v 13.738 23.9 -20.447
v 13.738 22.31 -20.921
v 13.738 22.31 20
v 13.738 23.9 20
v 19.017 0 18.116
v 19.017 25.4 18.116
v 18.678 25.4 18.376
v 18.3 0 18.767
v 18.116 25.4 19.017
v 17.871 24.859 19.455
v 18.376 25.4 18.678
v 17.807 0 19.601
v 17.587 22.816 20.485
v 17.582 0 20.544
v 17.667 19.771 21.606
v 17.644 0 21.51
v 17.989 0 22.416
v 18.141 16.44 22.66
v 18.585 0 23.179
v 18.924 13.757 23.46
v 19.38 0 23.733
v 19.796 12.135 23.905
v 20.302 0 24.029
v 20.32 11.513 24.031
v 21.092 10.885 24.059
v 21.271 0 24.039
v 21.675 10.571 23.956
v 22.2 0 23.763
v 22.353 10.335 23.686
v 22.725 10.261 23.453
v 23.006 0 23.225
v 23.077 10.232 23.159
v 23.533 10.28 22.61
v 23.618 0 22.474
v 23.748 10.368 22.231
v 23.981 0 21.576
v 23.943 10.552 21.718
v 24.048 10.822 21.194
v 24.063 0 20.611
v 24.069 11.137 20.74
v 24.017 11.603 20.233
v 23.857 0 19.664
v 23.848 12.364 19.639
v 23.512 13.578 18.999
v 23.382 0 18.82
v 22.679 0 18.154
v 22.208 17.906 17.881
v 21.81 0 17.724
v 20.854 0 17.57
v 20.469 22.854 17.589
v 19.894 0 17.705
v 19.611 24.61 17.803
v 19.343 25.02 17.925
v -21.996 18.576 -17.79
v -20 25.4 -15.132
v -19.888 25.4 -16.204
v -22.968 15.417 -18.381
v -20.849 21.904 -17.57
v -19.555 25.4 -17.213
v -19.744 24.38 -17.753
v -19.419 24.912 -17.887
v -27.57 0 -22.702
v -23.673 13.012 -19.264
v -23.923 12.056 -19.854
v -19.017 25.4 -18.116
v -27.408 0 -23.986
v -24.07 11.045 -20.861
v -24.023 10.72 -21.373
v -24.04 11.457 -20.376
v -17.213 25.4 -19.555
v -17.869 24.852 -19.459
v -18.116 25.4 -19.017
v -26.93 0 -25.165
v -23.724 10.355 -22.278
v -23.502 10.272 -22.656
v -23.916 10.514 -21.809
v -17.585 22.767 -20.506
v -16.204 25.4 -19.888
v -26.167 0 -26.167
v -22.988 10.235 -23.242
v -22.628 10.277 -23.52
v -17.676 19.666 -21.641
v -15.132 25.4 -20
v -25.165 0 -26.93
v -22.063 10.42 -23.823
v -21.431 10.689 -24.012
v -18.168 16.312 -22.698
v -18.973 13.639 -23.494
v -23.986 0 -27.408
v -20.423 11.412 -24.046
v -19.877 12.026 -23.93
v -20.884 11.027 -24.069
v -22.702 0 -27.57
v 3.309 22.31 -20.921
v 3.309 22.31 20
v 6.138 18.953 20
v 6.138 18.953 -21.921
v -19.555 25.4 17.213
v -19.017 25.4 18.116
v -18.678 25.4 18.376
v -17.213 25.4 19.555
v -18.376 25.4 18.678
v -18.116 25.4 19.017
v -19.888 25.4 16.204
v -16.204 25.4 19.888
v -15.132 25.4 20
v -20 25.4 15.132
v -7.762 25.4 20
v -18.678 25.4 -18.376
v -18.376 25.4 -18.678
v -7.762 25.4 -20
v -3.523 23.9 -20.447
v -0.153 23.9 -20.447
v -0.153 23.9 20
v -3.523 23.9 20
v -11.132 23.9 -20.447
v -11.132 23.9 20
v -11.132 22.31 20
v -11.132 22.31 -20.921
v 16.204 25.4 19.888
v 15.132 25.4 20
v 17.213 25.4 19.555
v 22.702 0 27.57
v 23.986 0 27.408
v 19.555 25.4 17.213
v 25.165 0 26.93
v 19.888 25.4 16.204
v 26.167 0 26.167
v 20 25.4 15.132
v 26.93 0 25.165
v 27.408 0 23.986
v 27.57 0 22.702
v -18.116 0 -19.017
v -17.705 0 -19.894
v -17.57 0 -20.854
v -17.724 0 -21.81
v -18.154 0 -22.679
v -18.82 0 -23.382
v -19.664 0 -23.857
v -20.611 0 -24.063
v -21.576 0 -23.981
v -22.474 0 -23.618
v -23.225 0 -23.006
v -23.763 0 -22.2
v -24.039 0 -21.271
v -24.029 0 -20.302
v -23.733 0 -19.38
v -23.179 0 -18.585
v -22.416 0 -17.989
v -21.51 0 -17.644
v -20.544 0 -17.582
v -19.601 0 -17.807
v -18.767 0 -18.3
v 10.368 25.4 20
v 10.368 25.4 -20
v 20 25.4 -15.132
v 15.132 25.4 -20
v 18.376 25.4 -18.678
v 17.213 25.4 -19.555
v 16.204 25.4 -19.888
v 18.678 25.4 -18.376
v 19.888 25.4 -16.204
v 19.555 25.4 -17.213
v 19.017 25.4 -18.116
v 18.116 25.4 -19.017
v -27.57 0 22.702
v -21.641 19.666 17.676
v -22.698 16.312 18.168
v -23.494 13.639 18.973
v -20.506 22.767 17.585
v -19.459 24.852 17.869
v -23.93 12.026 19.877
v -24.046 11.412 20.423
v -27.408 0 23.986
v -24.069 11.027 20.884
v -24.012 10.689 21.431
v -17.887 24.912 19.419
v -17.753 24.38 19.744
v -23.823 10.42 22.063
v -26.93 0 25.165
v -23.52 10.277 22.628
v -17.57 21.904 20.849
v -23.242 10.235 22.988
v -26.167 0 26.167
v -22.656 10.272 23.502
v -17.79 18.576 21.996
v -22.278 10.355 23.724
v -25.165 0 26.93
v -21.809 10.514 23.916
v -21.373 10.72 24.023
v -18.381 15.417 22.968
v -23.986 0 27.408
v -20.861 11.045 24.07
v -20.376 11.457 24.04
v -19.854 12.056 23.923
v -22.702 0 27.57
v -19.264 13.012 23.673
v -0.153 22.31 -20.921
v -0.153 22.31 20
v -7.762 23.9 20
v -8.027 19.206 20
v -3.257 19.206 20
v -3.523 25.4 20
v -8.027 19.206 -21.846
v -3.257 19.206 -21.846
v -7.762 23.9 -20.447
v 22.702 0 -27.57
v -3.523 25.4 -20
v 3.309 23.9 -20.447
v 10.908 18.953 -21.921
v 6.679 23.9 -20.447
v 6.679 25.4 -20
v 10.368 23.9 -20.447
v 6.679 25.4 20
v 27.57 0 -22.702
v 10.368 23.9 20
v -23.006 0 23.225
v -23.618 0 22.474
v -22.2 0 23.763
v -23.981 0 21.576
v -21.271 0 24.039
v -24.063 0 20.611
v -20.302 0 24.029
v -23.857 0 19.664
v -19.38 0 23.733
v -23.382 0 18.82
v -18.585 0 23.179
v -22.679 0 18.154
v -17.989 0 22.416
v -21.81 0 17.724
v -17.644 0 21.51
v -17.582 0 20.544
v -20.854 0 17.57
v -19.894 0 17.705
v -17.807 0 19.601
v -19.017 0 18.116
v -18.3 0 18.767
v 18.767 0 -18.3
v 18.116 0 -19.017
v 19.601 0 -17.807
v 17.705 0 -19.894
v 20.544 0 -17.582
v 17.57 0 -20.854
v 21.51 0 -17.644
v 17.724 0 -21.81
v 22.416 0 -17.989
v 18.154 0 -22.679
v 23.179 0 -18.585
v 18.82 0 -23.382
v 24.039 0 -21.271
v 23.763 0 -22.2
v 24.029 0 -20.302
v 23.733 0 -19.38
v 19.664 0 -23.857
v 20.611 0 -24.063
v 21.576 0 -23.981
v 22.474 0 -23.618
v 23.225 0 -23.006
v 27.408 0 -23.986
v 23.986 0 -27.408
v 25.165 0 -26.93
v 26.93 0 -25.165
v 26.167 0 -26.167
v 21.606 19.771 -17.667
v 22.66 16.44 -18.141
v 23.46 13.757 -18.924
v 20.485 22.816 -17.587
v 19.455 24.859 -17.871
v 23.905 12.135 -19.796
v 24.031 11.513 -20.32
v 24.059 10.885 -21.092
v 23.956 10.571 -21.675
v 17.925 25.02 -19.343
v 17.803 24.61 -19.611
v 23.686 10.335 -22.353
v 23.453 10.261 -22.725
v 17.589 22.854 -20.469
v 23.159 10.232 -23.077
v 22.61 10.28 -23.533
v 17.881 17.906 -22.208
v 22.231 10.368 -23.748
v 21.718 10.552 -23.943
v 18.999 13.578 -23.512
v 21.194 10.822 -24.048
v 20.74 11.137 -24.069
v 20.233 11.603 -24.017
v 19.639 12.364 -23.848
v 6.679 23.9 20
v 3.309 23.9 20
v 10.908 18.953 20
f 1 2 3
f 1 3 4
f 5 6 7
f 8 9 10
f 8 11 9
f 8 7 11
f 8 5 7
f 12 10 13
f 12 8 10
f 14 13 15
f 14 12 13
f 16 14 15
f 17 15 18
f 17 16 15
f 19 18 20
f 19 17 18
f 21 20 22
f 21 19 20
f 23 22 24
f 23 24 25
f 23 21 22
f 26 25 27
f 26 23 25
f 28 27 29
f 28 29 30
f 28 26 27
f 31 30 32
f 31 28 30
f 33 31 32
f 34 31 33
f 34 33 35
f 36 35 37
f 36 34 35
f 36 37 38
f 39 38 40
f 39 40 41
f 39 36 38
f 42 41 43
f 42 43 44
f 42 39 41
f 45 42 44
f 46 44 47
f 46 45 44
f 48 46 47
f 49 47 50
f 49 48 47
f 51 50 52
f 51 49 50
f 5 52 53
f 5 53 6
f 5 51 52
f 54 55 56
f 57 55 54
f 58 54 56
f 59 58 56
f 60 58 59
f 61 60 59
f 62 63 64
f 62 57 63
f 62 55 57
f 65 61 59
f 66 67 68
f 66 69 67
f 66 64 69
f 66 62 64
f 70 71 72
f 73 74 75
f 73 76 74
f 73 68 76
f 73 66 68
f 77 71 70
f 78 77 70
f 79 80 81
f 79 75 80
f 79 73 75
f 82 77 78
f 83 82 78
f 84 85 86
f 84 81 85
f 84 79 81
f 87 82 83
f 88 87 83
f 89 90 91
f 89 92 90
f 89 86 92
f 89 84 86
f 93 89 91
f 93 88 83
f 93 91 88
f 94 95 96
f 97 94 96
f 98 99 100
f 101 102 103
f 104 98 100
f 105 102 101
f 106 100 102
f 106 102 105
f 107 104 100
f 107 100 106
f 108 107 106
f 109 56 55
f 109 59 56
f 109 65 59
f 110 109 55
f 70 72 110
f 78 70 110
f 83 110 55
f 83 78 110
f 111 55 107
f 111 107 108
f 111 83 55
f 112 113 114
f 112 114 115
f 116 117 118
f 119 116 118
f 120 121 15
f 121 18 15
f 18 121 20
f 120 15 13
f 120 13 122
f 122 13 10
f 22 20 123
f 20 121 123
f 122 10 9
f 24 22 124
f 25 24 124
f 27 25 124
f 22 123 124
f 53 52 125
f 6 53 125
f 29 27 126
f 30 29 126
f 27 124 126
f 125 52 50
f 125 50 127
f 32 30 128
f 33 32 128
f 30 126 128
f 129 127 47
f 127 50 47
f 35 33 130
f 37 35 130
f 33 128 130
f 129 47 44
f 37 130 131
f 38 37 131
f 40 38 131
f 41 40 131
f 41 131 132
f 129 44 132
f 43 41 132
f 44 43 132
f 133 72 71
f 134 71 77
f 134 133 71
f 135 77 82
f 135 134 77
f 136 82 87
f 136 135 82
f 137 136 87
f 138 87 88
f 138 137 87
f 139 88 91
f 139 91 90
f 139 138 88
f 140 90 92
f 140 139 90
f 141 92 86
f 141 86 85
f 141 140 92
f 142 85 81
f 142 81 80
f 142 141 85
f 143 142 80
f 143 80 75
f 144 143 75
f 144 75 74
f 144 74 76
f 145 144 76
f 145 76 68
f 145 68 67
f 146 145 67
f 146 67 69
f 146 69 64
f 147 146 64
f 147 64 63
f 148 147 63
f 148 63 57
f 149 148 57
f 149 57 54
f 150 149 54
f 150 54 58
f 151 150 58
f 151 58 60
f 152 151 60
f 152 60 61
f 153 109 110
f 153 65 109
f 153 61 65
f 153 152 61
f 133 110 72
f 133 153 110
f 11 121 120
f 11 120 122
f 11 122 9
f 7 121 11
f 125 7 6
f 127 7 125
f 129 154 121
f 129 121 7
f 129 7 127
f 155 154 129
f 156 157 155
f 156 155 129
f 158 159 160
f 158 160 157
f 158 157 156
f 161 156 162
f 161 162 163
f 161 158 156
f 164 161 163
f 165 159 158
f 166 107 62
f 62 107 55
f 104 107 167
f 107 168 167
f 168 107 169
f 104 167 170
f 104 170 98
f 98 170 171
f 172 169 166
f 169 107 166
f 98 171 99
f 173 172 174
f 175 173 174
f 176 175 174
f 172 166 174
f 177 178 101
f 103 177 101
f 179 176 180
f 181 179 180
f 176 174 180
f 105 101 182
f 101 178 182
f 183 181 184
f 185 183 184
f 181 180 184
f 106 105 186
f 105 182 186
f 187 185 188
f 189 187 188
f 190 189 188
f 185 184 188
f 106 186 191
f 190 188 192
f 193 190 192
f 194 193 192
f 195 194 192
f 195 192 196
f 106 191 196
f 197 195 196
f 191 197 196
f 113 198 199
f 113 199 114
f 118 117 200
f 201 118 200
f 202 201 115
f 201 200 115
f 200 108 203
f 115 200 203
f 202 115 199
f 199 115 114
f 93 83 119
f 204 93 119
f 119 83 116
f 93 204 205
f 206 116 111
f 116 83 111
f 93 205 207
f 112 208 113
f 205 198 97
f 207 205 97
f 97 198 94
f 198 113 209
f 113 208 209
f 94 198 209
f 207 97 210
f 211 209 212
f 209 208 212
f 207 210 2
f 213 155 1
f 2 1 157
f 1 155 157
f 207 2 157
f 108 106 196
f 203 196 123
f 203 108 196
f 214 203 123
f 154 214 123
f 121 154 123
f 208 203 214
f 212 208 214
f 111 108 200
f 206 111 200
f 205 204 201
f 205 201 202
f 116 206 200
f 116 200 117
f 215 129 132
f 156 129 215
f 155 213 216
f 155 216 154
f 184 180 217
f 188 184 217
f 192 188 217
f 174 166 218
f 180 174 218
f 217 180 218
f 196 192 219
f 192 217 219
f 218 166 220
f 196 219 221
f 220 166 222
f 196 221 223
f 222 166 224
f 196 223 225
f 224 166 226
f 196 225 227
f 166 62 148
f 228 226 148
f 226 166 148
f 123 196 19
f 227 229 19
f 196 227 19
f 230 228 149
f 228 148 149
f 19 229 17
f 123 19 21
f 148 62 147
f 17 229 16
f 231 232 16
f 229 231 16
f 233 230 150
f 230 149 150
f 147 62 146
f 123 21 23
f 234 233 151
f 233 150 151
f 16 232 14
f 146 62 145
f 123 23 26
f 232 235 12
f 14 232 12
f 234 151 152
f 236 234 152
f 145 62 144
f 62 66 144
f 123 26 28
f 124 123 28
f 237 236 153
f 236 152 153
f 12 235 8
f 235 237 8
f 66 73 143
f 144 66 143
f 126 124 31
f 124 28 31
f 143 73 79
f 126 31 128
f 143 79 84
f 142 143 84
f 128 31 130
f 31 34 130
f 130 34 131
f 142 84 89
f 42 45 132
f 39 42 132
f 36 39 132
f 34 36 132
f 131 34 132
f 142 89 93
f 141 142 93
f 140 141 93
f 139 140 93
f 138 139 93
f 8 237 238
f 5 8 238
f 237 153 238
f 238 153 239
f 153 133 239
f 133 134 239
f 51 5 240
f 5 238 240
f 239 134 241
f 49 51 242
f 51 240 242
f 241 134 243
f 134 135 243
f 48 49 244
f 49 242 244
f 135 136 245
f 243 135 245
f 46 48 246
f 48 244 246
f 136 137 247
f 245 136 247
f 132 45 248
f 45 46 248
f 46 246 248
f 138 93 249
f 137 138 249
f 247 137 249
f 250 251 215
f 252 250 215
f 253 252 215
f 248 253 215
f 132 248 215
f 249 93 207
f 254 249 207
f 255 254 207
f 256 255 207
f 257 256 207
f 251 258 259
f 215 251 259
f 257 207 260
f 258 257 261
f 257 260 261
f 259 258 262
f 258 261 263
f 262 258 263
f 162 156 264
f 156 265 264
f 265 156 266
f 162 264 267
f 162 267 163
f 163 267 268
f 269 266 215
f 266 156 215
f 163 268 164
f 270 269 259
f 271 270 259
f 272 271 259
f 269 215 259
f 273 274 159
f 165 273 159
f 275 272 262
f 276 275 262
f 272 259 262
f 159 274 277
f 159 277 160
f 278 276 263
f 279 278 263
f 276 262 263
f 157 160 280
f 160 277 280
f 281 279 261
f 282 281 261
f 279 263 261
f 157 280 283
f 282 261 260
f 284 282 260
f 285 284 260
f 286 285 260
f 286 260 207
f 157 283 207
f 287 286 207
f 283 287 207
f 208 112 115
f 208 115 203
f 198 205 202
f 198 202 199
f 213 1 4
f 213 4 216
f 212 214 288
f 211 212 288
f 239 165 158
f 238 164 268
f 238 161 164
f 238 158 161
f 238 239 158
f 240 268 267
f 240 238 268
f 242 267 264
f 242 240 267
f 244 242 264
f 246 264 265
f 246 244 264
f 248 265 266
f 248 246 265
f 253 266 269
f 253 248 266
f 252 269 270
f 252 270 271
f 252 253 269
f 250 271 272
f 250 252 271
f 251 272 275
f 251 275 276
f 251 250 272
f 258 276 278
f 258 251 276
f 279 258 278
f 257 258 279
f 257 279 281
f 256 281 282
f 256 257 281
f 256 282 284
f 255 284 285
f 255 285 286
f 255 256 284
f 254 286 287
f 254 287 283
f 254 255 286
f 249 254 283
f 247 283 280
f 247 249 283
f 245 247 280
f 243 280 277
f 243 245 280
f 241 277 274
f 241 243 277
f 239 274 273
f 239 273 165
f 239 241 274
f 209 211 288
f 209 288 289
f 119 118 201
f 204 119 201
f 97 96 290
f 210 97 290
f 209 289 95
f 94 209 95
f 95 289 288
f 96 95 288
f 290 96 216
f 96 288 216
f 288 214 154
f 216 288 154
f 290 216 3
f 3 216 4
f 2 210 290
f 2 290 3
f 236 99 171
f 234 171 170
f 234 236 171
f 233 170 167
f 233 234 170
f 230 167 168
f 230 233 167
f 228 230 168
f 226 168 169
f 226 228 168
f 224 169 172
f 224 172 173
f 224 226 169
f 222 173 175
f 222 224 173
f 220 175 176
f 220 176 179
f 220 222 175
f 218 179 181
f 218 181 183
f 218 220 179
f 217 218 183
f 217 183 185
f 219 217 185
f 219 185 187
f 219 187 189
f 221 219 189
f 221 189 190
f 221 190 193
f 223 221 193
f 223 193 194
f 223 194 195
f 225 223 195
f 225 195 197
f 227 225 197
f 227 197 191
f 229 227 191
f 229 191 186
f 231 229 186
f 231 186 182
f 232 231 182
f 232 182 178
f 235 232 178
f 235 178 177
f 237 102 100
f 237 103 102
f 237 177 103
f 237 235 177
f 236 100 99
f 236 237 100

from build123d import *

# Parameters (mm, degrees)
SURFACE_FILL2_OUTLINE_W = 40
SURFACE_FILL2_OUTLINE_H = 40
SURFACE_FILL2_DEPTH     = 25.4
SURFACE_FILL2_DRAFT     = 16.595714
FILLET2_R               = 5.08
CUT_EXTRUDE3_DEPTH      = 47.53353416
CUT_EXTRUDE3_DEPTH_BACK = 47.53353416
SKETCH11_R              = 3.25
CUT_EXTRUDE4_START      = -41.921317507
CUT_EXTRUDE4_DEPTH      = 41.921317507


# Read off the part's stored shape, not the designer's step: Surface-Fill2, Cut-Extrude4
with BuildPart() as part:
    # Surface-Fill2 outline → Surface-Fill2 (with draft: the straight prism first)
    with BuildSketch(Plane(origin=(0, 25.4, 0), x_dir=(1, 0, 0), z_dir=(0, 1, 0))):
        Rectangle(SURFACE_FILL2_OUTLINE_W, SURFACE_FILL2_OUTLINE_H)
    extrude(amount=-SURFACE_FILL2_DEPTH)
    # Surface-Fill2: the draft: its side faces are tilted about the plane it starts from
    surface_fill2_sides = [part.faces().sort_by_distance(p)[0] for p in [
        (-20, 12.7, 0),
        (0, 12.7, 20),
        (20, 12.7, 0),
        (0, 12.7, -20),
    ]]
    draft(surface_fill2_sides, Plane(origin=(0, 25.4, 0), x_dir=(1, 0, 0), z_dir=(0, 1, 0)), SURFACE_FILL2_DRAFT)

    # Fillet2
    fillet2_edges = [part.edges().sort_by_distance(p)[0] for p in [
        (23.785000007, 12.7, -23.785000007),
        (23.785000007, 12.7, 23.785000007),
        (-23.785000007, 12.7, -23.785000007),
        (-23.785000007, 12.7, 23.785000007),
    ]]
    fillet(fillet2_edges, radius=FILLET2_R)

    # Sketch11 → Cut-Extrude3 (cut, two sides: drawn at the far end of the back side and taken through both)
    with BuildSketch(Plane(origin=(0, 0, 0), x_dir=(1, 0, 0), z_dir=(0, 1, 0)).offset(-CUT_EXTRUDE3_DEPTH_BACK)):
        with Locations(Location((-20.82, 20.82, 0), (0, 0, 326.308545858))):
            Circle(SKETCH11_R)
        with Locations(Location((20.82, 20.82, 0), (0, 0, 213.691454142))):
            Circle(SKETCH11_R)
        with Locations(Location((-20.82, -20.82, 0), (0, 0, 56.308545858))):
            Circle(SKETCH11_R)
        with Locations(Location((20.82, -20.82, 0), (0, 0, 123.691454142))):
            Circle(SKETCH11_R)
    extrude(amount=CUT_EXTRUDE3_DEPTH + CUT_EXTRUDE3_DEPTH_BACK, mode=Mode.SUBTRACT)

    # Cut-Extrude4 outline → Cut-Extrude4 (cut)
    with BuildSketch(Plane.XY.offset(20).offset(CUT_EXTRUDE4_START)):
        Polygon((13.737759609, 22.31), (13.737759609, 23.9), (10.367759609, 23.9), (10.367759609, 25.4), (6.679239208, 25.4), (6.679239208, 23.9), (3.309239208, 23.9), (3.309239208, 22.31), (6.138499409, 18.953307175), (10.908499409, 18.953307175), align=None)
        Polygon((-3.523215232, 23.9), (-3.523215232, 25.4), (-7.761612771, 25.4), (-7.761612771, 23.9), (-11.131612771, 23.9), (-11.131612771, 22.31), (-8.027414001, 19.205801231), (-3.257414001, 19.205801231), (-0.153215232, 22.31), (-0.153215232, 23.9), align=None)
    extrude(amount=CUT_EXTRUDE4_DEPTH, mode=Mode.SUBTRACT)


solid = part.part
